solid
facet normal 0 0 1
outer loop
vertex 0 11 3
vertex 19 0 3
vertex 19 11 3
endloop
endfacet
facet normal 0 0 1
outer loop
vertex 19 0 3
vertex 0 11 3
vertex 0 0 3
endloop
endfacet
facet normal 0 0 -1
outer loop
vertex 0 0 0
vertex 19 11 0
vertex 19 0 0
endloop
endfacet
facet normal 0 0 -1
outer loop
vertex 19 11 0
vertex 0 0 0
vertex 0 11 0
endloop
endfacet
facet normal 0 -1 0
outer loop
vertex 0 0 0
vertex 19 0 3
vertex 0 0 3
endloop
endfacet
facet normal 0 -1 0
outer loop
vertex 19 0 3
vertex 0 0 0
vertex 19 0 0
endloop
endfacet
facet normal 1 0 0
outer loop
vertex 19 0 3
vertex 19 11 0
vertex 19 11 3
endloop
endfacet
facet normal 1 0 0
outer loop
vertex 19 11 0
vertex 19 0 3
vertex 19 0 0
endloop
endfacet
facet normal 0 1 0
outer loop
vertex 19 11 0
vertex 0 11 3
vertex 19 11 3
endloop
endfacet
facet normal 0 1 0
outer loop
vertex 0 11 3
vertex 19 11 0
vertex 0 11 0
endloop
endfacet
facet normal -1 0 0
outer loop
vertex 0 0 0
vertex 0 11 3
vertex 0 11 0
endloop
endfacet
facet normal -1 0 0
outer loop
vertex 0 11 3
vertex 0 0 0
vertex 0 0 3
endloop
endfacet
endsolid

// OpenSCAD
// Generated by SolidPython 1.0.1 on 2020-07-29 00:46:56


cube(size = [19, 11, 3]);
/***********************************************
*********      SolidPython code:      **********
************************************************
 
# import packages: SolidPython
from solid import *
from solid.utils import *
from itertools import chain, combinations, permutations


class Resize:

    def __init__(self, scad_file):
        self.scad_file = scad_file
        #self.scad_file = import_scad(scad_file)
        # cone/cylinder param:
        self.r1 = 0
        self.r2 = 0
        self.h = 0
        # rectangular prism param:
        self.w = 0
        self.l = 0
        # ellipse param:
        self.r = 0

    # import OpenScad code (file name corresponds to shape)


    # classify shape + parameters
    def assign(self, param1, param2, param3):
        if self.scad_file == 'cone.scad':
            self.r1 = param1
            self.r2 = param2
            self.h = param3
        elif self.scad_file == 'cylinder.scad':
            self.r1 = param1
            self.r2 = param2
            self.h = param3
        elif self.scad_file == 'rectangularPrism.scad':
            self.h = param1
            self.l = param2
            self.w = param3
        else:
            self.r = param1
            self.h = param2

    # resize parameters
    def iterate(self):
        x = range(3, 20, 2)
        i = 1
        if self.scad_file == 'cone.scad':
            tempList = list(permutations(x, 2))
            for temp in tempList:
                param1 = temp[0]
                param2 = temp[1]
                filepath = 'produced_scad_files/' + 'cone' + str(param1) + '_' + str(param2) + '_' + '.scad'
                scad_render_to_file(cylinder(h=param1, r1=param2, r2=0), filepath)

        elif self.scad_file == 'cylinder.scad':
            tempList = list(permutations(x, 3))
            for temp in tempList:
                param1 = temp[0]
                param2 = temp[1]
                filepath = 'produced_scad_files/' + 'cylinder' + str(param1) + '_' + str(param2) + '_' + '.scad'
                scad_render_to_file(cylinder(h=param1, r1=param2, r2=param2), filepath)

        elif self.scad_file == 'rectangularPrism.scad':
            tempList = list(permutations(x, 3))
            for temp in tempList:
                param1 = temp[0]
                param2 = temp[1]
                param3 = temp[2]
                filepath = 'produced_scad_files/' + 'rectangularPrism' + str(param1) + '_' + str(param2) + '_' + str(
                    param3) + '.scad'
                scad_render_to_file(cube(size=(param1, param2, param3)), filepath)

        elif self.scad_file == 'ellipse.scad':
            tempList = list(permutations(x, 4))
            for temp in tempList:
                param1 = temp[0]
                param2 = temp[1]
                param3 = temp[2]
                param4 = temp[3]
                filepath = 'produced_scad_files/' + 'ellipse' + str(param1) + '_' + str(param2) + '_' + str(param3) + '_' + str(param4) + '.scad'
                scad_render_to_file(scale([param1, param2, param3])(sphere(r=param4)), filepath)

    def render_to_scadfile(self):
        scad_render_to_file(scad, 'example.scad') 
 
************************************************/
